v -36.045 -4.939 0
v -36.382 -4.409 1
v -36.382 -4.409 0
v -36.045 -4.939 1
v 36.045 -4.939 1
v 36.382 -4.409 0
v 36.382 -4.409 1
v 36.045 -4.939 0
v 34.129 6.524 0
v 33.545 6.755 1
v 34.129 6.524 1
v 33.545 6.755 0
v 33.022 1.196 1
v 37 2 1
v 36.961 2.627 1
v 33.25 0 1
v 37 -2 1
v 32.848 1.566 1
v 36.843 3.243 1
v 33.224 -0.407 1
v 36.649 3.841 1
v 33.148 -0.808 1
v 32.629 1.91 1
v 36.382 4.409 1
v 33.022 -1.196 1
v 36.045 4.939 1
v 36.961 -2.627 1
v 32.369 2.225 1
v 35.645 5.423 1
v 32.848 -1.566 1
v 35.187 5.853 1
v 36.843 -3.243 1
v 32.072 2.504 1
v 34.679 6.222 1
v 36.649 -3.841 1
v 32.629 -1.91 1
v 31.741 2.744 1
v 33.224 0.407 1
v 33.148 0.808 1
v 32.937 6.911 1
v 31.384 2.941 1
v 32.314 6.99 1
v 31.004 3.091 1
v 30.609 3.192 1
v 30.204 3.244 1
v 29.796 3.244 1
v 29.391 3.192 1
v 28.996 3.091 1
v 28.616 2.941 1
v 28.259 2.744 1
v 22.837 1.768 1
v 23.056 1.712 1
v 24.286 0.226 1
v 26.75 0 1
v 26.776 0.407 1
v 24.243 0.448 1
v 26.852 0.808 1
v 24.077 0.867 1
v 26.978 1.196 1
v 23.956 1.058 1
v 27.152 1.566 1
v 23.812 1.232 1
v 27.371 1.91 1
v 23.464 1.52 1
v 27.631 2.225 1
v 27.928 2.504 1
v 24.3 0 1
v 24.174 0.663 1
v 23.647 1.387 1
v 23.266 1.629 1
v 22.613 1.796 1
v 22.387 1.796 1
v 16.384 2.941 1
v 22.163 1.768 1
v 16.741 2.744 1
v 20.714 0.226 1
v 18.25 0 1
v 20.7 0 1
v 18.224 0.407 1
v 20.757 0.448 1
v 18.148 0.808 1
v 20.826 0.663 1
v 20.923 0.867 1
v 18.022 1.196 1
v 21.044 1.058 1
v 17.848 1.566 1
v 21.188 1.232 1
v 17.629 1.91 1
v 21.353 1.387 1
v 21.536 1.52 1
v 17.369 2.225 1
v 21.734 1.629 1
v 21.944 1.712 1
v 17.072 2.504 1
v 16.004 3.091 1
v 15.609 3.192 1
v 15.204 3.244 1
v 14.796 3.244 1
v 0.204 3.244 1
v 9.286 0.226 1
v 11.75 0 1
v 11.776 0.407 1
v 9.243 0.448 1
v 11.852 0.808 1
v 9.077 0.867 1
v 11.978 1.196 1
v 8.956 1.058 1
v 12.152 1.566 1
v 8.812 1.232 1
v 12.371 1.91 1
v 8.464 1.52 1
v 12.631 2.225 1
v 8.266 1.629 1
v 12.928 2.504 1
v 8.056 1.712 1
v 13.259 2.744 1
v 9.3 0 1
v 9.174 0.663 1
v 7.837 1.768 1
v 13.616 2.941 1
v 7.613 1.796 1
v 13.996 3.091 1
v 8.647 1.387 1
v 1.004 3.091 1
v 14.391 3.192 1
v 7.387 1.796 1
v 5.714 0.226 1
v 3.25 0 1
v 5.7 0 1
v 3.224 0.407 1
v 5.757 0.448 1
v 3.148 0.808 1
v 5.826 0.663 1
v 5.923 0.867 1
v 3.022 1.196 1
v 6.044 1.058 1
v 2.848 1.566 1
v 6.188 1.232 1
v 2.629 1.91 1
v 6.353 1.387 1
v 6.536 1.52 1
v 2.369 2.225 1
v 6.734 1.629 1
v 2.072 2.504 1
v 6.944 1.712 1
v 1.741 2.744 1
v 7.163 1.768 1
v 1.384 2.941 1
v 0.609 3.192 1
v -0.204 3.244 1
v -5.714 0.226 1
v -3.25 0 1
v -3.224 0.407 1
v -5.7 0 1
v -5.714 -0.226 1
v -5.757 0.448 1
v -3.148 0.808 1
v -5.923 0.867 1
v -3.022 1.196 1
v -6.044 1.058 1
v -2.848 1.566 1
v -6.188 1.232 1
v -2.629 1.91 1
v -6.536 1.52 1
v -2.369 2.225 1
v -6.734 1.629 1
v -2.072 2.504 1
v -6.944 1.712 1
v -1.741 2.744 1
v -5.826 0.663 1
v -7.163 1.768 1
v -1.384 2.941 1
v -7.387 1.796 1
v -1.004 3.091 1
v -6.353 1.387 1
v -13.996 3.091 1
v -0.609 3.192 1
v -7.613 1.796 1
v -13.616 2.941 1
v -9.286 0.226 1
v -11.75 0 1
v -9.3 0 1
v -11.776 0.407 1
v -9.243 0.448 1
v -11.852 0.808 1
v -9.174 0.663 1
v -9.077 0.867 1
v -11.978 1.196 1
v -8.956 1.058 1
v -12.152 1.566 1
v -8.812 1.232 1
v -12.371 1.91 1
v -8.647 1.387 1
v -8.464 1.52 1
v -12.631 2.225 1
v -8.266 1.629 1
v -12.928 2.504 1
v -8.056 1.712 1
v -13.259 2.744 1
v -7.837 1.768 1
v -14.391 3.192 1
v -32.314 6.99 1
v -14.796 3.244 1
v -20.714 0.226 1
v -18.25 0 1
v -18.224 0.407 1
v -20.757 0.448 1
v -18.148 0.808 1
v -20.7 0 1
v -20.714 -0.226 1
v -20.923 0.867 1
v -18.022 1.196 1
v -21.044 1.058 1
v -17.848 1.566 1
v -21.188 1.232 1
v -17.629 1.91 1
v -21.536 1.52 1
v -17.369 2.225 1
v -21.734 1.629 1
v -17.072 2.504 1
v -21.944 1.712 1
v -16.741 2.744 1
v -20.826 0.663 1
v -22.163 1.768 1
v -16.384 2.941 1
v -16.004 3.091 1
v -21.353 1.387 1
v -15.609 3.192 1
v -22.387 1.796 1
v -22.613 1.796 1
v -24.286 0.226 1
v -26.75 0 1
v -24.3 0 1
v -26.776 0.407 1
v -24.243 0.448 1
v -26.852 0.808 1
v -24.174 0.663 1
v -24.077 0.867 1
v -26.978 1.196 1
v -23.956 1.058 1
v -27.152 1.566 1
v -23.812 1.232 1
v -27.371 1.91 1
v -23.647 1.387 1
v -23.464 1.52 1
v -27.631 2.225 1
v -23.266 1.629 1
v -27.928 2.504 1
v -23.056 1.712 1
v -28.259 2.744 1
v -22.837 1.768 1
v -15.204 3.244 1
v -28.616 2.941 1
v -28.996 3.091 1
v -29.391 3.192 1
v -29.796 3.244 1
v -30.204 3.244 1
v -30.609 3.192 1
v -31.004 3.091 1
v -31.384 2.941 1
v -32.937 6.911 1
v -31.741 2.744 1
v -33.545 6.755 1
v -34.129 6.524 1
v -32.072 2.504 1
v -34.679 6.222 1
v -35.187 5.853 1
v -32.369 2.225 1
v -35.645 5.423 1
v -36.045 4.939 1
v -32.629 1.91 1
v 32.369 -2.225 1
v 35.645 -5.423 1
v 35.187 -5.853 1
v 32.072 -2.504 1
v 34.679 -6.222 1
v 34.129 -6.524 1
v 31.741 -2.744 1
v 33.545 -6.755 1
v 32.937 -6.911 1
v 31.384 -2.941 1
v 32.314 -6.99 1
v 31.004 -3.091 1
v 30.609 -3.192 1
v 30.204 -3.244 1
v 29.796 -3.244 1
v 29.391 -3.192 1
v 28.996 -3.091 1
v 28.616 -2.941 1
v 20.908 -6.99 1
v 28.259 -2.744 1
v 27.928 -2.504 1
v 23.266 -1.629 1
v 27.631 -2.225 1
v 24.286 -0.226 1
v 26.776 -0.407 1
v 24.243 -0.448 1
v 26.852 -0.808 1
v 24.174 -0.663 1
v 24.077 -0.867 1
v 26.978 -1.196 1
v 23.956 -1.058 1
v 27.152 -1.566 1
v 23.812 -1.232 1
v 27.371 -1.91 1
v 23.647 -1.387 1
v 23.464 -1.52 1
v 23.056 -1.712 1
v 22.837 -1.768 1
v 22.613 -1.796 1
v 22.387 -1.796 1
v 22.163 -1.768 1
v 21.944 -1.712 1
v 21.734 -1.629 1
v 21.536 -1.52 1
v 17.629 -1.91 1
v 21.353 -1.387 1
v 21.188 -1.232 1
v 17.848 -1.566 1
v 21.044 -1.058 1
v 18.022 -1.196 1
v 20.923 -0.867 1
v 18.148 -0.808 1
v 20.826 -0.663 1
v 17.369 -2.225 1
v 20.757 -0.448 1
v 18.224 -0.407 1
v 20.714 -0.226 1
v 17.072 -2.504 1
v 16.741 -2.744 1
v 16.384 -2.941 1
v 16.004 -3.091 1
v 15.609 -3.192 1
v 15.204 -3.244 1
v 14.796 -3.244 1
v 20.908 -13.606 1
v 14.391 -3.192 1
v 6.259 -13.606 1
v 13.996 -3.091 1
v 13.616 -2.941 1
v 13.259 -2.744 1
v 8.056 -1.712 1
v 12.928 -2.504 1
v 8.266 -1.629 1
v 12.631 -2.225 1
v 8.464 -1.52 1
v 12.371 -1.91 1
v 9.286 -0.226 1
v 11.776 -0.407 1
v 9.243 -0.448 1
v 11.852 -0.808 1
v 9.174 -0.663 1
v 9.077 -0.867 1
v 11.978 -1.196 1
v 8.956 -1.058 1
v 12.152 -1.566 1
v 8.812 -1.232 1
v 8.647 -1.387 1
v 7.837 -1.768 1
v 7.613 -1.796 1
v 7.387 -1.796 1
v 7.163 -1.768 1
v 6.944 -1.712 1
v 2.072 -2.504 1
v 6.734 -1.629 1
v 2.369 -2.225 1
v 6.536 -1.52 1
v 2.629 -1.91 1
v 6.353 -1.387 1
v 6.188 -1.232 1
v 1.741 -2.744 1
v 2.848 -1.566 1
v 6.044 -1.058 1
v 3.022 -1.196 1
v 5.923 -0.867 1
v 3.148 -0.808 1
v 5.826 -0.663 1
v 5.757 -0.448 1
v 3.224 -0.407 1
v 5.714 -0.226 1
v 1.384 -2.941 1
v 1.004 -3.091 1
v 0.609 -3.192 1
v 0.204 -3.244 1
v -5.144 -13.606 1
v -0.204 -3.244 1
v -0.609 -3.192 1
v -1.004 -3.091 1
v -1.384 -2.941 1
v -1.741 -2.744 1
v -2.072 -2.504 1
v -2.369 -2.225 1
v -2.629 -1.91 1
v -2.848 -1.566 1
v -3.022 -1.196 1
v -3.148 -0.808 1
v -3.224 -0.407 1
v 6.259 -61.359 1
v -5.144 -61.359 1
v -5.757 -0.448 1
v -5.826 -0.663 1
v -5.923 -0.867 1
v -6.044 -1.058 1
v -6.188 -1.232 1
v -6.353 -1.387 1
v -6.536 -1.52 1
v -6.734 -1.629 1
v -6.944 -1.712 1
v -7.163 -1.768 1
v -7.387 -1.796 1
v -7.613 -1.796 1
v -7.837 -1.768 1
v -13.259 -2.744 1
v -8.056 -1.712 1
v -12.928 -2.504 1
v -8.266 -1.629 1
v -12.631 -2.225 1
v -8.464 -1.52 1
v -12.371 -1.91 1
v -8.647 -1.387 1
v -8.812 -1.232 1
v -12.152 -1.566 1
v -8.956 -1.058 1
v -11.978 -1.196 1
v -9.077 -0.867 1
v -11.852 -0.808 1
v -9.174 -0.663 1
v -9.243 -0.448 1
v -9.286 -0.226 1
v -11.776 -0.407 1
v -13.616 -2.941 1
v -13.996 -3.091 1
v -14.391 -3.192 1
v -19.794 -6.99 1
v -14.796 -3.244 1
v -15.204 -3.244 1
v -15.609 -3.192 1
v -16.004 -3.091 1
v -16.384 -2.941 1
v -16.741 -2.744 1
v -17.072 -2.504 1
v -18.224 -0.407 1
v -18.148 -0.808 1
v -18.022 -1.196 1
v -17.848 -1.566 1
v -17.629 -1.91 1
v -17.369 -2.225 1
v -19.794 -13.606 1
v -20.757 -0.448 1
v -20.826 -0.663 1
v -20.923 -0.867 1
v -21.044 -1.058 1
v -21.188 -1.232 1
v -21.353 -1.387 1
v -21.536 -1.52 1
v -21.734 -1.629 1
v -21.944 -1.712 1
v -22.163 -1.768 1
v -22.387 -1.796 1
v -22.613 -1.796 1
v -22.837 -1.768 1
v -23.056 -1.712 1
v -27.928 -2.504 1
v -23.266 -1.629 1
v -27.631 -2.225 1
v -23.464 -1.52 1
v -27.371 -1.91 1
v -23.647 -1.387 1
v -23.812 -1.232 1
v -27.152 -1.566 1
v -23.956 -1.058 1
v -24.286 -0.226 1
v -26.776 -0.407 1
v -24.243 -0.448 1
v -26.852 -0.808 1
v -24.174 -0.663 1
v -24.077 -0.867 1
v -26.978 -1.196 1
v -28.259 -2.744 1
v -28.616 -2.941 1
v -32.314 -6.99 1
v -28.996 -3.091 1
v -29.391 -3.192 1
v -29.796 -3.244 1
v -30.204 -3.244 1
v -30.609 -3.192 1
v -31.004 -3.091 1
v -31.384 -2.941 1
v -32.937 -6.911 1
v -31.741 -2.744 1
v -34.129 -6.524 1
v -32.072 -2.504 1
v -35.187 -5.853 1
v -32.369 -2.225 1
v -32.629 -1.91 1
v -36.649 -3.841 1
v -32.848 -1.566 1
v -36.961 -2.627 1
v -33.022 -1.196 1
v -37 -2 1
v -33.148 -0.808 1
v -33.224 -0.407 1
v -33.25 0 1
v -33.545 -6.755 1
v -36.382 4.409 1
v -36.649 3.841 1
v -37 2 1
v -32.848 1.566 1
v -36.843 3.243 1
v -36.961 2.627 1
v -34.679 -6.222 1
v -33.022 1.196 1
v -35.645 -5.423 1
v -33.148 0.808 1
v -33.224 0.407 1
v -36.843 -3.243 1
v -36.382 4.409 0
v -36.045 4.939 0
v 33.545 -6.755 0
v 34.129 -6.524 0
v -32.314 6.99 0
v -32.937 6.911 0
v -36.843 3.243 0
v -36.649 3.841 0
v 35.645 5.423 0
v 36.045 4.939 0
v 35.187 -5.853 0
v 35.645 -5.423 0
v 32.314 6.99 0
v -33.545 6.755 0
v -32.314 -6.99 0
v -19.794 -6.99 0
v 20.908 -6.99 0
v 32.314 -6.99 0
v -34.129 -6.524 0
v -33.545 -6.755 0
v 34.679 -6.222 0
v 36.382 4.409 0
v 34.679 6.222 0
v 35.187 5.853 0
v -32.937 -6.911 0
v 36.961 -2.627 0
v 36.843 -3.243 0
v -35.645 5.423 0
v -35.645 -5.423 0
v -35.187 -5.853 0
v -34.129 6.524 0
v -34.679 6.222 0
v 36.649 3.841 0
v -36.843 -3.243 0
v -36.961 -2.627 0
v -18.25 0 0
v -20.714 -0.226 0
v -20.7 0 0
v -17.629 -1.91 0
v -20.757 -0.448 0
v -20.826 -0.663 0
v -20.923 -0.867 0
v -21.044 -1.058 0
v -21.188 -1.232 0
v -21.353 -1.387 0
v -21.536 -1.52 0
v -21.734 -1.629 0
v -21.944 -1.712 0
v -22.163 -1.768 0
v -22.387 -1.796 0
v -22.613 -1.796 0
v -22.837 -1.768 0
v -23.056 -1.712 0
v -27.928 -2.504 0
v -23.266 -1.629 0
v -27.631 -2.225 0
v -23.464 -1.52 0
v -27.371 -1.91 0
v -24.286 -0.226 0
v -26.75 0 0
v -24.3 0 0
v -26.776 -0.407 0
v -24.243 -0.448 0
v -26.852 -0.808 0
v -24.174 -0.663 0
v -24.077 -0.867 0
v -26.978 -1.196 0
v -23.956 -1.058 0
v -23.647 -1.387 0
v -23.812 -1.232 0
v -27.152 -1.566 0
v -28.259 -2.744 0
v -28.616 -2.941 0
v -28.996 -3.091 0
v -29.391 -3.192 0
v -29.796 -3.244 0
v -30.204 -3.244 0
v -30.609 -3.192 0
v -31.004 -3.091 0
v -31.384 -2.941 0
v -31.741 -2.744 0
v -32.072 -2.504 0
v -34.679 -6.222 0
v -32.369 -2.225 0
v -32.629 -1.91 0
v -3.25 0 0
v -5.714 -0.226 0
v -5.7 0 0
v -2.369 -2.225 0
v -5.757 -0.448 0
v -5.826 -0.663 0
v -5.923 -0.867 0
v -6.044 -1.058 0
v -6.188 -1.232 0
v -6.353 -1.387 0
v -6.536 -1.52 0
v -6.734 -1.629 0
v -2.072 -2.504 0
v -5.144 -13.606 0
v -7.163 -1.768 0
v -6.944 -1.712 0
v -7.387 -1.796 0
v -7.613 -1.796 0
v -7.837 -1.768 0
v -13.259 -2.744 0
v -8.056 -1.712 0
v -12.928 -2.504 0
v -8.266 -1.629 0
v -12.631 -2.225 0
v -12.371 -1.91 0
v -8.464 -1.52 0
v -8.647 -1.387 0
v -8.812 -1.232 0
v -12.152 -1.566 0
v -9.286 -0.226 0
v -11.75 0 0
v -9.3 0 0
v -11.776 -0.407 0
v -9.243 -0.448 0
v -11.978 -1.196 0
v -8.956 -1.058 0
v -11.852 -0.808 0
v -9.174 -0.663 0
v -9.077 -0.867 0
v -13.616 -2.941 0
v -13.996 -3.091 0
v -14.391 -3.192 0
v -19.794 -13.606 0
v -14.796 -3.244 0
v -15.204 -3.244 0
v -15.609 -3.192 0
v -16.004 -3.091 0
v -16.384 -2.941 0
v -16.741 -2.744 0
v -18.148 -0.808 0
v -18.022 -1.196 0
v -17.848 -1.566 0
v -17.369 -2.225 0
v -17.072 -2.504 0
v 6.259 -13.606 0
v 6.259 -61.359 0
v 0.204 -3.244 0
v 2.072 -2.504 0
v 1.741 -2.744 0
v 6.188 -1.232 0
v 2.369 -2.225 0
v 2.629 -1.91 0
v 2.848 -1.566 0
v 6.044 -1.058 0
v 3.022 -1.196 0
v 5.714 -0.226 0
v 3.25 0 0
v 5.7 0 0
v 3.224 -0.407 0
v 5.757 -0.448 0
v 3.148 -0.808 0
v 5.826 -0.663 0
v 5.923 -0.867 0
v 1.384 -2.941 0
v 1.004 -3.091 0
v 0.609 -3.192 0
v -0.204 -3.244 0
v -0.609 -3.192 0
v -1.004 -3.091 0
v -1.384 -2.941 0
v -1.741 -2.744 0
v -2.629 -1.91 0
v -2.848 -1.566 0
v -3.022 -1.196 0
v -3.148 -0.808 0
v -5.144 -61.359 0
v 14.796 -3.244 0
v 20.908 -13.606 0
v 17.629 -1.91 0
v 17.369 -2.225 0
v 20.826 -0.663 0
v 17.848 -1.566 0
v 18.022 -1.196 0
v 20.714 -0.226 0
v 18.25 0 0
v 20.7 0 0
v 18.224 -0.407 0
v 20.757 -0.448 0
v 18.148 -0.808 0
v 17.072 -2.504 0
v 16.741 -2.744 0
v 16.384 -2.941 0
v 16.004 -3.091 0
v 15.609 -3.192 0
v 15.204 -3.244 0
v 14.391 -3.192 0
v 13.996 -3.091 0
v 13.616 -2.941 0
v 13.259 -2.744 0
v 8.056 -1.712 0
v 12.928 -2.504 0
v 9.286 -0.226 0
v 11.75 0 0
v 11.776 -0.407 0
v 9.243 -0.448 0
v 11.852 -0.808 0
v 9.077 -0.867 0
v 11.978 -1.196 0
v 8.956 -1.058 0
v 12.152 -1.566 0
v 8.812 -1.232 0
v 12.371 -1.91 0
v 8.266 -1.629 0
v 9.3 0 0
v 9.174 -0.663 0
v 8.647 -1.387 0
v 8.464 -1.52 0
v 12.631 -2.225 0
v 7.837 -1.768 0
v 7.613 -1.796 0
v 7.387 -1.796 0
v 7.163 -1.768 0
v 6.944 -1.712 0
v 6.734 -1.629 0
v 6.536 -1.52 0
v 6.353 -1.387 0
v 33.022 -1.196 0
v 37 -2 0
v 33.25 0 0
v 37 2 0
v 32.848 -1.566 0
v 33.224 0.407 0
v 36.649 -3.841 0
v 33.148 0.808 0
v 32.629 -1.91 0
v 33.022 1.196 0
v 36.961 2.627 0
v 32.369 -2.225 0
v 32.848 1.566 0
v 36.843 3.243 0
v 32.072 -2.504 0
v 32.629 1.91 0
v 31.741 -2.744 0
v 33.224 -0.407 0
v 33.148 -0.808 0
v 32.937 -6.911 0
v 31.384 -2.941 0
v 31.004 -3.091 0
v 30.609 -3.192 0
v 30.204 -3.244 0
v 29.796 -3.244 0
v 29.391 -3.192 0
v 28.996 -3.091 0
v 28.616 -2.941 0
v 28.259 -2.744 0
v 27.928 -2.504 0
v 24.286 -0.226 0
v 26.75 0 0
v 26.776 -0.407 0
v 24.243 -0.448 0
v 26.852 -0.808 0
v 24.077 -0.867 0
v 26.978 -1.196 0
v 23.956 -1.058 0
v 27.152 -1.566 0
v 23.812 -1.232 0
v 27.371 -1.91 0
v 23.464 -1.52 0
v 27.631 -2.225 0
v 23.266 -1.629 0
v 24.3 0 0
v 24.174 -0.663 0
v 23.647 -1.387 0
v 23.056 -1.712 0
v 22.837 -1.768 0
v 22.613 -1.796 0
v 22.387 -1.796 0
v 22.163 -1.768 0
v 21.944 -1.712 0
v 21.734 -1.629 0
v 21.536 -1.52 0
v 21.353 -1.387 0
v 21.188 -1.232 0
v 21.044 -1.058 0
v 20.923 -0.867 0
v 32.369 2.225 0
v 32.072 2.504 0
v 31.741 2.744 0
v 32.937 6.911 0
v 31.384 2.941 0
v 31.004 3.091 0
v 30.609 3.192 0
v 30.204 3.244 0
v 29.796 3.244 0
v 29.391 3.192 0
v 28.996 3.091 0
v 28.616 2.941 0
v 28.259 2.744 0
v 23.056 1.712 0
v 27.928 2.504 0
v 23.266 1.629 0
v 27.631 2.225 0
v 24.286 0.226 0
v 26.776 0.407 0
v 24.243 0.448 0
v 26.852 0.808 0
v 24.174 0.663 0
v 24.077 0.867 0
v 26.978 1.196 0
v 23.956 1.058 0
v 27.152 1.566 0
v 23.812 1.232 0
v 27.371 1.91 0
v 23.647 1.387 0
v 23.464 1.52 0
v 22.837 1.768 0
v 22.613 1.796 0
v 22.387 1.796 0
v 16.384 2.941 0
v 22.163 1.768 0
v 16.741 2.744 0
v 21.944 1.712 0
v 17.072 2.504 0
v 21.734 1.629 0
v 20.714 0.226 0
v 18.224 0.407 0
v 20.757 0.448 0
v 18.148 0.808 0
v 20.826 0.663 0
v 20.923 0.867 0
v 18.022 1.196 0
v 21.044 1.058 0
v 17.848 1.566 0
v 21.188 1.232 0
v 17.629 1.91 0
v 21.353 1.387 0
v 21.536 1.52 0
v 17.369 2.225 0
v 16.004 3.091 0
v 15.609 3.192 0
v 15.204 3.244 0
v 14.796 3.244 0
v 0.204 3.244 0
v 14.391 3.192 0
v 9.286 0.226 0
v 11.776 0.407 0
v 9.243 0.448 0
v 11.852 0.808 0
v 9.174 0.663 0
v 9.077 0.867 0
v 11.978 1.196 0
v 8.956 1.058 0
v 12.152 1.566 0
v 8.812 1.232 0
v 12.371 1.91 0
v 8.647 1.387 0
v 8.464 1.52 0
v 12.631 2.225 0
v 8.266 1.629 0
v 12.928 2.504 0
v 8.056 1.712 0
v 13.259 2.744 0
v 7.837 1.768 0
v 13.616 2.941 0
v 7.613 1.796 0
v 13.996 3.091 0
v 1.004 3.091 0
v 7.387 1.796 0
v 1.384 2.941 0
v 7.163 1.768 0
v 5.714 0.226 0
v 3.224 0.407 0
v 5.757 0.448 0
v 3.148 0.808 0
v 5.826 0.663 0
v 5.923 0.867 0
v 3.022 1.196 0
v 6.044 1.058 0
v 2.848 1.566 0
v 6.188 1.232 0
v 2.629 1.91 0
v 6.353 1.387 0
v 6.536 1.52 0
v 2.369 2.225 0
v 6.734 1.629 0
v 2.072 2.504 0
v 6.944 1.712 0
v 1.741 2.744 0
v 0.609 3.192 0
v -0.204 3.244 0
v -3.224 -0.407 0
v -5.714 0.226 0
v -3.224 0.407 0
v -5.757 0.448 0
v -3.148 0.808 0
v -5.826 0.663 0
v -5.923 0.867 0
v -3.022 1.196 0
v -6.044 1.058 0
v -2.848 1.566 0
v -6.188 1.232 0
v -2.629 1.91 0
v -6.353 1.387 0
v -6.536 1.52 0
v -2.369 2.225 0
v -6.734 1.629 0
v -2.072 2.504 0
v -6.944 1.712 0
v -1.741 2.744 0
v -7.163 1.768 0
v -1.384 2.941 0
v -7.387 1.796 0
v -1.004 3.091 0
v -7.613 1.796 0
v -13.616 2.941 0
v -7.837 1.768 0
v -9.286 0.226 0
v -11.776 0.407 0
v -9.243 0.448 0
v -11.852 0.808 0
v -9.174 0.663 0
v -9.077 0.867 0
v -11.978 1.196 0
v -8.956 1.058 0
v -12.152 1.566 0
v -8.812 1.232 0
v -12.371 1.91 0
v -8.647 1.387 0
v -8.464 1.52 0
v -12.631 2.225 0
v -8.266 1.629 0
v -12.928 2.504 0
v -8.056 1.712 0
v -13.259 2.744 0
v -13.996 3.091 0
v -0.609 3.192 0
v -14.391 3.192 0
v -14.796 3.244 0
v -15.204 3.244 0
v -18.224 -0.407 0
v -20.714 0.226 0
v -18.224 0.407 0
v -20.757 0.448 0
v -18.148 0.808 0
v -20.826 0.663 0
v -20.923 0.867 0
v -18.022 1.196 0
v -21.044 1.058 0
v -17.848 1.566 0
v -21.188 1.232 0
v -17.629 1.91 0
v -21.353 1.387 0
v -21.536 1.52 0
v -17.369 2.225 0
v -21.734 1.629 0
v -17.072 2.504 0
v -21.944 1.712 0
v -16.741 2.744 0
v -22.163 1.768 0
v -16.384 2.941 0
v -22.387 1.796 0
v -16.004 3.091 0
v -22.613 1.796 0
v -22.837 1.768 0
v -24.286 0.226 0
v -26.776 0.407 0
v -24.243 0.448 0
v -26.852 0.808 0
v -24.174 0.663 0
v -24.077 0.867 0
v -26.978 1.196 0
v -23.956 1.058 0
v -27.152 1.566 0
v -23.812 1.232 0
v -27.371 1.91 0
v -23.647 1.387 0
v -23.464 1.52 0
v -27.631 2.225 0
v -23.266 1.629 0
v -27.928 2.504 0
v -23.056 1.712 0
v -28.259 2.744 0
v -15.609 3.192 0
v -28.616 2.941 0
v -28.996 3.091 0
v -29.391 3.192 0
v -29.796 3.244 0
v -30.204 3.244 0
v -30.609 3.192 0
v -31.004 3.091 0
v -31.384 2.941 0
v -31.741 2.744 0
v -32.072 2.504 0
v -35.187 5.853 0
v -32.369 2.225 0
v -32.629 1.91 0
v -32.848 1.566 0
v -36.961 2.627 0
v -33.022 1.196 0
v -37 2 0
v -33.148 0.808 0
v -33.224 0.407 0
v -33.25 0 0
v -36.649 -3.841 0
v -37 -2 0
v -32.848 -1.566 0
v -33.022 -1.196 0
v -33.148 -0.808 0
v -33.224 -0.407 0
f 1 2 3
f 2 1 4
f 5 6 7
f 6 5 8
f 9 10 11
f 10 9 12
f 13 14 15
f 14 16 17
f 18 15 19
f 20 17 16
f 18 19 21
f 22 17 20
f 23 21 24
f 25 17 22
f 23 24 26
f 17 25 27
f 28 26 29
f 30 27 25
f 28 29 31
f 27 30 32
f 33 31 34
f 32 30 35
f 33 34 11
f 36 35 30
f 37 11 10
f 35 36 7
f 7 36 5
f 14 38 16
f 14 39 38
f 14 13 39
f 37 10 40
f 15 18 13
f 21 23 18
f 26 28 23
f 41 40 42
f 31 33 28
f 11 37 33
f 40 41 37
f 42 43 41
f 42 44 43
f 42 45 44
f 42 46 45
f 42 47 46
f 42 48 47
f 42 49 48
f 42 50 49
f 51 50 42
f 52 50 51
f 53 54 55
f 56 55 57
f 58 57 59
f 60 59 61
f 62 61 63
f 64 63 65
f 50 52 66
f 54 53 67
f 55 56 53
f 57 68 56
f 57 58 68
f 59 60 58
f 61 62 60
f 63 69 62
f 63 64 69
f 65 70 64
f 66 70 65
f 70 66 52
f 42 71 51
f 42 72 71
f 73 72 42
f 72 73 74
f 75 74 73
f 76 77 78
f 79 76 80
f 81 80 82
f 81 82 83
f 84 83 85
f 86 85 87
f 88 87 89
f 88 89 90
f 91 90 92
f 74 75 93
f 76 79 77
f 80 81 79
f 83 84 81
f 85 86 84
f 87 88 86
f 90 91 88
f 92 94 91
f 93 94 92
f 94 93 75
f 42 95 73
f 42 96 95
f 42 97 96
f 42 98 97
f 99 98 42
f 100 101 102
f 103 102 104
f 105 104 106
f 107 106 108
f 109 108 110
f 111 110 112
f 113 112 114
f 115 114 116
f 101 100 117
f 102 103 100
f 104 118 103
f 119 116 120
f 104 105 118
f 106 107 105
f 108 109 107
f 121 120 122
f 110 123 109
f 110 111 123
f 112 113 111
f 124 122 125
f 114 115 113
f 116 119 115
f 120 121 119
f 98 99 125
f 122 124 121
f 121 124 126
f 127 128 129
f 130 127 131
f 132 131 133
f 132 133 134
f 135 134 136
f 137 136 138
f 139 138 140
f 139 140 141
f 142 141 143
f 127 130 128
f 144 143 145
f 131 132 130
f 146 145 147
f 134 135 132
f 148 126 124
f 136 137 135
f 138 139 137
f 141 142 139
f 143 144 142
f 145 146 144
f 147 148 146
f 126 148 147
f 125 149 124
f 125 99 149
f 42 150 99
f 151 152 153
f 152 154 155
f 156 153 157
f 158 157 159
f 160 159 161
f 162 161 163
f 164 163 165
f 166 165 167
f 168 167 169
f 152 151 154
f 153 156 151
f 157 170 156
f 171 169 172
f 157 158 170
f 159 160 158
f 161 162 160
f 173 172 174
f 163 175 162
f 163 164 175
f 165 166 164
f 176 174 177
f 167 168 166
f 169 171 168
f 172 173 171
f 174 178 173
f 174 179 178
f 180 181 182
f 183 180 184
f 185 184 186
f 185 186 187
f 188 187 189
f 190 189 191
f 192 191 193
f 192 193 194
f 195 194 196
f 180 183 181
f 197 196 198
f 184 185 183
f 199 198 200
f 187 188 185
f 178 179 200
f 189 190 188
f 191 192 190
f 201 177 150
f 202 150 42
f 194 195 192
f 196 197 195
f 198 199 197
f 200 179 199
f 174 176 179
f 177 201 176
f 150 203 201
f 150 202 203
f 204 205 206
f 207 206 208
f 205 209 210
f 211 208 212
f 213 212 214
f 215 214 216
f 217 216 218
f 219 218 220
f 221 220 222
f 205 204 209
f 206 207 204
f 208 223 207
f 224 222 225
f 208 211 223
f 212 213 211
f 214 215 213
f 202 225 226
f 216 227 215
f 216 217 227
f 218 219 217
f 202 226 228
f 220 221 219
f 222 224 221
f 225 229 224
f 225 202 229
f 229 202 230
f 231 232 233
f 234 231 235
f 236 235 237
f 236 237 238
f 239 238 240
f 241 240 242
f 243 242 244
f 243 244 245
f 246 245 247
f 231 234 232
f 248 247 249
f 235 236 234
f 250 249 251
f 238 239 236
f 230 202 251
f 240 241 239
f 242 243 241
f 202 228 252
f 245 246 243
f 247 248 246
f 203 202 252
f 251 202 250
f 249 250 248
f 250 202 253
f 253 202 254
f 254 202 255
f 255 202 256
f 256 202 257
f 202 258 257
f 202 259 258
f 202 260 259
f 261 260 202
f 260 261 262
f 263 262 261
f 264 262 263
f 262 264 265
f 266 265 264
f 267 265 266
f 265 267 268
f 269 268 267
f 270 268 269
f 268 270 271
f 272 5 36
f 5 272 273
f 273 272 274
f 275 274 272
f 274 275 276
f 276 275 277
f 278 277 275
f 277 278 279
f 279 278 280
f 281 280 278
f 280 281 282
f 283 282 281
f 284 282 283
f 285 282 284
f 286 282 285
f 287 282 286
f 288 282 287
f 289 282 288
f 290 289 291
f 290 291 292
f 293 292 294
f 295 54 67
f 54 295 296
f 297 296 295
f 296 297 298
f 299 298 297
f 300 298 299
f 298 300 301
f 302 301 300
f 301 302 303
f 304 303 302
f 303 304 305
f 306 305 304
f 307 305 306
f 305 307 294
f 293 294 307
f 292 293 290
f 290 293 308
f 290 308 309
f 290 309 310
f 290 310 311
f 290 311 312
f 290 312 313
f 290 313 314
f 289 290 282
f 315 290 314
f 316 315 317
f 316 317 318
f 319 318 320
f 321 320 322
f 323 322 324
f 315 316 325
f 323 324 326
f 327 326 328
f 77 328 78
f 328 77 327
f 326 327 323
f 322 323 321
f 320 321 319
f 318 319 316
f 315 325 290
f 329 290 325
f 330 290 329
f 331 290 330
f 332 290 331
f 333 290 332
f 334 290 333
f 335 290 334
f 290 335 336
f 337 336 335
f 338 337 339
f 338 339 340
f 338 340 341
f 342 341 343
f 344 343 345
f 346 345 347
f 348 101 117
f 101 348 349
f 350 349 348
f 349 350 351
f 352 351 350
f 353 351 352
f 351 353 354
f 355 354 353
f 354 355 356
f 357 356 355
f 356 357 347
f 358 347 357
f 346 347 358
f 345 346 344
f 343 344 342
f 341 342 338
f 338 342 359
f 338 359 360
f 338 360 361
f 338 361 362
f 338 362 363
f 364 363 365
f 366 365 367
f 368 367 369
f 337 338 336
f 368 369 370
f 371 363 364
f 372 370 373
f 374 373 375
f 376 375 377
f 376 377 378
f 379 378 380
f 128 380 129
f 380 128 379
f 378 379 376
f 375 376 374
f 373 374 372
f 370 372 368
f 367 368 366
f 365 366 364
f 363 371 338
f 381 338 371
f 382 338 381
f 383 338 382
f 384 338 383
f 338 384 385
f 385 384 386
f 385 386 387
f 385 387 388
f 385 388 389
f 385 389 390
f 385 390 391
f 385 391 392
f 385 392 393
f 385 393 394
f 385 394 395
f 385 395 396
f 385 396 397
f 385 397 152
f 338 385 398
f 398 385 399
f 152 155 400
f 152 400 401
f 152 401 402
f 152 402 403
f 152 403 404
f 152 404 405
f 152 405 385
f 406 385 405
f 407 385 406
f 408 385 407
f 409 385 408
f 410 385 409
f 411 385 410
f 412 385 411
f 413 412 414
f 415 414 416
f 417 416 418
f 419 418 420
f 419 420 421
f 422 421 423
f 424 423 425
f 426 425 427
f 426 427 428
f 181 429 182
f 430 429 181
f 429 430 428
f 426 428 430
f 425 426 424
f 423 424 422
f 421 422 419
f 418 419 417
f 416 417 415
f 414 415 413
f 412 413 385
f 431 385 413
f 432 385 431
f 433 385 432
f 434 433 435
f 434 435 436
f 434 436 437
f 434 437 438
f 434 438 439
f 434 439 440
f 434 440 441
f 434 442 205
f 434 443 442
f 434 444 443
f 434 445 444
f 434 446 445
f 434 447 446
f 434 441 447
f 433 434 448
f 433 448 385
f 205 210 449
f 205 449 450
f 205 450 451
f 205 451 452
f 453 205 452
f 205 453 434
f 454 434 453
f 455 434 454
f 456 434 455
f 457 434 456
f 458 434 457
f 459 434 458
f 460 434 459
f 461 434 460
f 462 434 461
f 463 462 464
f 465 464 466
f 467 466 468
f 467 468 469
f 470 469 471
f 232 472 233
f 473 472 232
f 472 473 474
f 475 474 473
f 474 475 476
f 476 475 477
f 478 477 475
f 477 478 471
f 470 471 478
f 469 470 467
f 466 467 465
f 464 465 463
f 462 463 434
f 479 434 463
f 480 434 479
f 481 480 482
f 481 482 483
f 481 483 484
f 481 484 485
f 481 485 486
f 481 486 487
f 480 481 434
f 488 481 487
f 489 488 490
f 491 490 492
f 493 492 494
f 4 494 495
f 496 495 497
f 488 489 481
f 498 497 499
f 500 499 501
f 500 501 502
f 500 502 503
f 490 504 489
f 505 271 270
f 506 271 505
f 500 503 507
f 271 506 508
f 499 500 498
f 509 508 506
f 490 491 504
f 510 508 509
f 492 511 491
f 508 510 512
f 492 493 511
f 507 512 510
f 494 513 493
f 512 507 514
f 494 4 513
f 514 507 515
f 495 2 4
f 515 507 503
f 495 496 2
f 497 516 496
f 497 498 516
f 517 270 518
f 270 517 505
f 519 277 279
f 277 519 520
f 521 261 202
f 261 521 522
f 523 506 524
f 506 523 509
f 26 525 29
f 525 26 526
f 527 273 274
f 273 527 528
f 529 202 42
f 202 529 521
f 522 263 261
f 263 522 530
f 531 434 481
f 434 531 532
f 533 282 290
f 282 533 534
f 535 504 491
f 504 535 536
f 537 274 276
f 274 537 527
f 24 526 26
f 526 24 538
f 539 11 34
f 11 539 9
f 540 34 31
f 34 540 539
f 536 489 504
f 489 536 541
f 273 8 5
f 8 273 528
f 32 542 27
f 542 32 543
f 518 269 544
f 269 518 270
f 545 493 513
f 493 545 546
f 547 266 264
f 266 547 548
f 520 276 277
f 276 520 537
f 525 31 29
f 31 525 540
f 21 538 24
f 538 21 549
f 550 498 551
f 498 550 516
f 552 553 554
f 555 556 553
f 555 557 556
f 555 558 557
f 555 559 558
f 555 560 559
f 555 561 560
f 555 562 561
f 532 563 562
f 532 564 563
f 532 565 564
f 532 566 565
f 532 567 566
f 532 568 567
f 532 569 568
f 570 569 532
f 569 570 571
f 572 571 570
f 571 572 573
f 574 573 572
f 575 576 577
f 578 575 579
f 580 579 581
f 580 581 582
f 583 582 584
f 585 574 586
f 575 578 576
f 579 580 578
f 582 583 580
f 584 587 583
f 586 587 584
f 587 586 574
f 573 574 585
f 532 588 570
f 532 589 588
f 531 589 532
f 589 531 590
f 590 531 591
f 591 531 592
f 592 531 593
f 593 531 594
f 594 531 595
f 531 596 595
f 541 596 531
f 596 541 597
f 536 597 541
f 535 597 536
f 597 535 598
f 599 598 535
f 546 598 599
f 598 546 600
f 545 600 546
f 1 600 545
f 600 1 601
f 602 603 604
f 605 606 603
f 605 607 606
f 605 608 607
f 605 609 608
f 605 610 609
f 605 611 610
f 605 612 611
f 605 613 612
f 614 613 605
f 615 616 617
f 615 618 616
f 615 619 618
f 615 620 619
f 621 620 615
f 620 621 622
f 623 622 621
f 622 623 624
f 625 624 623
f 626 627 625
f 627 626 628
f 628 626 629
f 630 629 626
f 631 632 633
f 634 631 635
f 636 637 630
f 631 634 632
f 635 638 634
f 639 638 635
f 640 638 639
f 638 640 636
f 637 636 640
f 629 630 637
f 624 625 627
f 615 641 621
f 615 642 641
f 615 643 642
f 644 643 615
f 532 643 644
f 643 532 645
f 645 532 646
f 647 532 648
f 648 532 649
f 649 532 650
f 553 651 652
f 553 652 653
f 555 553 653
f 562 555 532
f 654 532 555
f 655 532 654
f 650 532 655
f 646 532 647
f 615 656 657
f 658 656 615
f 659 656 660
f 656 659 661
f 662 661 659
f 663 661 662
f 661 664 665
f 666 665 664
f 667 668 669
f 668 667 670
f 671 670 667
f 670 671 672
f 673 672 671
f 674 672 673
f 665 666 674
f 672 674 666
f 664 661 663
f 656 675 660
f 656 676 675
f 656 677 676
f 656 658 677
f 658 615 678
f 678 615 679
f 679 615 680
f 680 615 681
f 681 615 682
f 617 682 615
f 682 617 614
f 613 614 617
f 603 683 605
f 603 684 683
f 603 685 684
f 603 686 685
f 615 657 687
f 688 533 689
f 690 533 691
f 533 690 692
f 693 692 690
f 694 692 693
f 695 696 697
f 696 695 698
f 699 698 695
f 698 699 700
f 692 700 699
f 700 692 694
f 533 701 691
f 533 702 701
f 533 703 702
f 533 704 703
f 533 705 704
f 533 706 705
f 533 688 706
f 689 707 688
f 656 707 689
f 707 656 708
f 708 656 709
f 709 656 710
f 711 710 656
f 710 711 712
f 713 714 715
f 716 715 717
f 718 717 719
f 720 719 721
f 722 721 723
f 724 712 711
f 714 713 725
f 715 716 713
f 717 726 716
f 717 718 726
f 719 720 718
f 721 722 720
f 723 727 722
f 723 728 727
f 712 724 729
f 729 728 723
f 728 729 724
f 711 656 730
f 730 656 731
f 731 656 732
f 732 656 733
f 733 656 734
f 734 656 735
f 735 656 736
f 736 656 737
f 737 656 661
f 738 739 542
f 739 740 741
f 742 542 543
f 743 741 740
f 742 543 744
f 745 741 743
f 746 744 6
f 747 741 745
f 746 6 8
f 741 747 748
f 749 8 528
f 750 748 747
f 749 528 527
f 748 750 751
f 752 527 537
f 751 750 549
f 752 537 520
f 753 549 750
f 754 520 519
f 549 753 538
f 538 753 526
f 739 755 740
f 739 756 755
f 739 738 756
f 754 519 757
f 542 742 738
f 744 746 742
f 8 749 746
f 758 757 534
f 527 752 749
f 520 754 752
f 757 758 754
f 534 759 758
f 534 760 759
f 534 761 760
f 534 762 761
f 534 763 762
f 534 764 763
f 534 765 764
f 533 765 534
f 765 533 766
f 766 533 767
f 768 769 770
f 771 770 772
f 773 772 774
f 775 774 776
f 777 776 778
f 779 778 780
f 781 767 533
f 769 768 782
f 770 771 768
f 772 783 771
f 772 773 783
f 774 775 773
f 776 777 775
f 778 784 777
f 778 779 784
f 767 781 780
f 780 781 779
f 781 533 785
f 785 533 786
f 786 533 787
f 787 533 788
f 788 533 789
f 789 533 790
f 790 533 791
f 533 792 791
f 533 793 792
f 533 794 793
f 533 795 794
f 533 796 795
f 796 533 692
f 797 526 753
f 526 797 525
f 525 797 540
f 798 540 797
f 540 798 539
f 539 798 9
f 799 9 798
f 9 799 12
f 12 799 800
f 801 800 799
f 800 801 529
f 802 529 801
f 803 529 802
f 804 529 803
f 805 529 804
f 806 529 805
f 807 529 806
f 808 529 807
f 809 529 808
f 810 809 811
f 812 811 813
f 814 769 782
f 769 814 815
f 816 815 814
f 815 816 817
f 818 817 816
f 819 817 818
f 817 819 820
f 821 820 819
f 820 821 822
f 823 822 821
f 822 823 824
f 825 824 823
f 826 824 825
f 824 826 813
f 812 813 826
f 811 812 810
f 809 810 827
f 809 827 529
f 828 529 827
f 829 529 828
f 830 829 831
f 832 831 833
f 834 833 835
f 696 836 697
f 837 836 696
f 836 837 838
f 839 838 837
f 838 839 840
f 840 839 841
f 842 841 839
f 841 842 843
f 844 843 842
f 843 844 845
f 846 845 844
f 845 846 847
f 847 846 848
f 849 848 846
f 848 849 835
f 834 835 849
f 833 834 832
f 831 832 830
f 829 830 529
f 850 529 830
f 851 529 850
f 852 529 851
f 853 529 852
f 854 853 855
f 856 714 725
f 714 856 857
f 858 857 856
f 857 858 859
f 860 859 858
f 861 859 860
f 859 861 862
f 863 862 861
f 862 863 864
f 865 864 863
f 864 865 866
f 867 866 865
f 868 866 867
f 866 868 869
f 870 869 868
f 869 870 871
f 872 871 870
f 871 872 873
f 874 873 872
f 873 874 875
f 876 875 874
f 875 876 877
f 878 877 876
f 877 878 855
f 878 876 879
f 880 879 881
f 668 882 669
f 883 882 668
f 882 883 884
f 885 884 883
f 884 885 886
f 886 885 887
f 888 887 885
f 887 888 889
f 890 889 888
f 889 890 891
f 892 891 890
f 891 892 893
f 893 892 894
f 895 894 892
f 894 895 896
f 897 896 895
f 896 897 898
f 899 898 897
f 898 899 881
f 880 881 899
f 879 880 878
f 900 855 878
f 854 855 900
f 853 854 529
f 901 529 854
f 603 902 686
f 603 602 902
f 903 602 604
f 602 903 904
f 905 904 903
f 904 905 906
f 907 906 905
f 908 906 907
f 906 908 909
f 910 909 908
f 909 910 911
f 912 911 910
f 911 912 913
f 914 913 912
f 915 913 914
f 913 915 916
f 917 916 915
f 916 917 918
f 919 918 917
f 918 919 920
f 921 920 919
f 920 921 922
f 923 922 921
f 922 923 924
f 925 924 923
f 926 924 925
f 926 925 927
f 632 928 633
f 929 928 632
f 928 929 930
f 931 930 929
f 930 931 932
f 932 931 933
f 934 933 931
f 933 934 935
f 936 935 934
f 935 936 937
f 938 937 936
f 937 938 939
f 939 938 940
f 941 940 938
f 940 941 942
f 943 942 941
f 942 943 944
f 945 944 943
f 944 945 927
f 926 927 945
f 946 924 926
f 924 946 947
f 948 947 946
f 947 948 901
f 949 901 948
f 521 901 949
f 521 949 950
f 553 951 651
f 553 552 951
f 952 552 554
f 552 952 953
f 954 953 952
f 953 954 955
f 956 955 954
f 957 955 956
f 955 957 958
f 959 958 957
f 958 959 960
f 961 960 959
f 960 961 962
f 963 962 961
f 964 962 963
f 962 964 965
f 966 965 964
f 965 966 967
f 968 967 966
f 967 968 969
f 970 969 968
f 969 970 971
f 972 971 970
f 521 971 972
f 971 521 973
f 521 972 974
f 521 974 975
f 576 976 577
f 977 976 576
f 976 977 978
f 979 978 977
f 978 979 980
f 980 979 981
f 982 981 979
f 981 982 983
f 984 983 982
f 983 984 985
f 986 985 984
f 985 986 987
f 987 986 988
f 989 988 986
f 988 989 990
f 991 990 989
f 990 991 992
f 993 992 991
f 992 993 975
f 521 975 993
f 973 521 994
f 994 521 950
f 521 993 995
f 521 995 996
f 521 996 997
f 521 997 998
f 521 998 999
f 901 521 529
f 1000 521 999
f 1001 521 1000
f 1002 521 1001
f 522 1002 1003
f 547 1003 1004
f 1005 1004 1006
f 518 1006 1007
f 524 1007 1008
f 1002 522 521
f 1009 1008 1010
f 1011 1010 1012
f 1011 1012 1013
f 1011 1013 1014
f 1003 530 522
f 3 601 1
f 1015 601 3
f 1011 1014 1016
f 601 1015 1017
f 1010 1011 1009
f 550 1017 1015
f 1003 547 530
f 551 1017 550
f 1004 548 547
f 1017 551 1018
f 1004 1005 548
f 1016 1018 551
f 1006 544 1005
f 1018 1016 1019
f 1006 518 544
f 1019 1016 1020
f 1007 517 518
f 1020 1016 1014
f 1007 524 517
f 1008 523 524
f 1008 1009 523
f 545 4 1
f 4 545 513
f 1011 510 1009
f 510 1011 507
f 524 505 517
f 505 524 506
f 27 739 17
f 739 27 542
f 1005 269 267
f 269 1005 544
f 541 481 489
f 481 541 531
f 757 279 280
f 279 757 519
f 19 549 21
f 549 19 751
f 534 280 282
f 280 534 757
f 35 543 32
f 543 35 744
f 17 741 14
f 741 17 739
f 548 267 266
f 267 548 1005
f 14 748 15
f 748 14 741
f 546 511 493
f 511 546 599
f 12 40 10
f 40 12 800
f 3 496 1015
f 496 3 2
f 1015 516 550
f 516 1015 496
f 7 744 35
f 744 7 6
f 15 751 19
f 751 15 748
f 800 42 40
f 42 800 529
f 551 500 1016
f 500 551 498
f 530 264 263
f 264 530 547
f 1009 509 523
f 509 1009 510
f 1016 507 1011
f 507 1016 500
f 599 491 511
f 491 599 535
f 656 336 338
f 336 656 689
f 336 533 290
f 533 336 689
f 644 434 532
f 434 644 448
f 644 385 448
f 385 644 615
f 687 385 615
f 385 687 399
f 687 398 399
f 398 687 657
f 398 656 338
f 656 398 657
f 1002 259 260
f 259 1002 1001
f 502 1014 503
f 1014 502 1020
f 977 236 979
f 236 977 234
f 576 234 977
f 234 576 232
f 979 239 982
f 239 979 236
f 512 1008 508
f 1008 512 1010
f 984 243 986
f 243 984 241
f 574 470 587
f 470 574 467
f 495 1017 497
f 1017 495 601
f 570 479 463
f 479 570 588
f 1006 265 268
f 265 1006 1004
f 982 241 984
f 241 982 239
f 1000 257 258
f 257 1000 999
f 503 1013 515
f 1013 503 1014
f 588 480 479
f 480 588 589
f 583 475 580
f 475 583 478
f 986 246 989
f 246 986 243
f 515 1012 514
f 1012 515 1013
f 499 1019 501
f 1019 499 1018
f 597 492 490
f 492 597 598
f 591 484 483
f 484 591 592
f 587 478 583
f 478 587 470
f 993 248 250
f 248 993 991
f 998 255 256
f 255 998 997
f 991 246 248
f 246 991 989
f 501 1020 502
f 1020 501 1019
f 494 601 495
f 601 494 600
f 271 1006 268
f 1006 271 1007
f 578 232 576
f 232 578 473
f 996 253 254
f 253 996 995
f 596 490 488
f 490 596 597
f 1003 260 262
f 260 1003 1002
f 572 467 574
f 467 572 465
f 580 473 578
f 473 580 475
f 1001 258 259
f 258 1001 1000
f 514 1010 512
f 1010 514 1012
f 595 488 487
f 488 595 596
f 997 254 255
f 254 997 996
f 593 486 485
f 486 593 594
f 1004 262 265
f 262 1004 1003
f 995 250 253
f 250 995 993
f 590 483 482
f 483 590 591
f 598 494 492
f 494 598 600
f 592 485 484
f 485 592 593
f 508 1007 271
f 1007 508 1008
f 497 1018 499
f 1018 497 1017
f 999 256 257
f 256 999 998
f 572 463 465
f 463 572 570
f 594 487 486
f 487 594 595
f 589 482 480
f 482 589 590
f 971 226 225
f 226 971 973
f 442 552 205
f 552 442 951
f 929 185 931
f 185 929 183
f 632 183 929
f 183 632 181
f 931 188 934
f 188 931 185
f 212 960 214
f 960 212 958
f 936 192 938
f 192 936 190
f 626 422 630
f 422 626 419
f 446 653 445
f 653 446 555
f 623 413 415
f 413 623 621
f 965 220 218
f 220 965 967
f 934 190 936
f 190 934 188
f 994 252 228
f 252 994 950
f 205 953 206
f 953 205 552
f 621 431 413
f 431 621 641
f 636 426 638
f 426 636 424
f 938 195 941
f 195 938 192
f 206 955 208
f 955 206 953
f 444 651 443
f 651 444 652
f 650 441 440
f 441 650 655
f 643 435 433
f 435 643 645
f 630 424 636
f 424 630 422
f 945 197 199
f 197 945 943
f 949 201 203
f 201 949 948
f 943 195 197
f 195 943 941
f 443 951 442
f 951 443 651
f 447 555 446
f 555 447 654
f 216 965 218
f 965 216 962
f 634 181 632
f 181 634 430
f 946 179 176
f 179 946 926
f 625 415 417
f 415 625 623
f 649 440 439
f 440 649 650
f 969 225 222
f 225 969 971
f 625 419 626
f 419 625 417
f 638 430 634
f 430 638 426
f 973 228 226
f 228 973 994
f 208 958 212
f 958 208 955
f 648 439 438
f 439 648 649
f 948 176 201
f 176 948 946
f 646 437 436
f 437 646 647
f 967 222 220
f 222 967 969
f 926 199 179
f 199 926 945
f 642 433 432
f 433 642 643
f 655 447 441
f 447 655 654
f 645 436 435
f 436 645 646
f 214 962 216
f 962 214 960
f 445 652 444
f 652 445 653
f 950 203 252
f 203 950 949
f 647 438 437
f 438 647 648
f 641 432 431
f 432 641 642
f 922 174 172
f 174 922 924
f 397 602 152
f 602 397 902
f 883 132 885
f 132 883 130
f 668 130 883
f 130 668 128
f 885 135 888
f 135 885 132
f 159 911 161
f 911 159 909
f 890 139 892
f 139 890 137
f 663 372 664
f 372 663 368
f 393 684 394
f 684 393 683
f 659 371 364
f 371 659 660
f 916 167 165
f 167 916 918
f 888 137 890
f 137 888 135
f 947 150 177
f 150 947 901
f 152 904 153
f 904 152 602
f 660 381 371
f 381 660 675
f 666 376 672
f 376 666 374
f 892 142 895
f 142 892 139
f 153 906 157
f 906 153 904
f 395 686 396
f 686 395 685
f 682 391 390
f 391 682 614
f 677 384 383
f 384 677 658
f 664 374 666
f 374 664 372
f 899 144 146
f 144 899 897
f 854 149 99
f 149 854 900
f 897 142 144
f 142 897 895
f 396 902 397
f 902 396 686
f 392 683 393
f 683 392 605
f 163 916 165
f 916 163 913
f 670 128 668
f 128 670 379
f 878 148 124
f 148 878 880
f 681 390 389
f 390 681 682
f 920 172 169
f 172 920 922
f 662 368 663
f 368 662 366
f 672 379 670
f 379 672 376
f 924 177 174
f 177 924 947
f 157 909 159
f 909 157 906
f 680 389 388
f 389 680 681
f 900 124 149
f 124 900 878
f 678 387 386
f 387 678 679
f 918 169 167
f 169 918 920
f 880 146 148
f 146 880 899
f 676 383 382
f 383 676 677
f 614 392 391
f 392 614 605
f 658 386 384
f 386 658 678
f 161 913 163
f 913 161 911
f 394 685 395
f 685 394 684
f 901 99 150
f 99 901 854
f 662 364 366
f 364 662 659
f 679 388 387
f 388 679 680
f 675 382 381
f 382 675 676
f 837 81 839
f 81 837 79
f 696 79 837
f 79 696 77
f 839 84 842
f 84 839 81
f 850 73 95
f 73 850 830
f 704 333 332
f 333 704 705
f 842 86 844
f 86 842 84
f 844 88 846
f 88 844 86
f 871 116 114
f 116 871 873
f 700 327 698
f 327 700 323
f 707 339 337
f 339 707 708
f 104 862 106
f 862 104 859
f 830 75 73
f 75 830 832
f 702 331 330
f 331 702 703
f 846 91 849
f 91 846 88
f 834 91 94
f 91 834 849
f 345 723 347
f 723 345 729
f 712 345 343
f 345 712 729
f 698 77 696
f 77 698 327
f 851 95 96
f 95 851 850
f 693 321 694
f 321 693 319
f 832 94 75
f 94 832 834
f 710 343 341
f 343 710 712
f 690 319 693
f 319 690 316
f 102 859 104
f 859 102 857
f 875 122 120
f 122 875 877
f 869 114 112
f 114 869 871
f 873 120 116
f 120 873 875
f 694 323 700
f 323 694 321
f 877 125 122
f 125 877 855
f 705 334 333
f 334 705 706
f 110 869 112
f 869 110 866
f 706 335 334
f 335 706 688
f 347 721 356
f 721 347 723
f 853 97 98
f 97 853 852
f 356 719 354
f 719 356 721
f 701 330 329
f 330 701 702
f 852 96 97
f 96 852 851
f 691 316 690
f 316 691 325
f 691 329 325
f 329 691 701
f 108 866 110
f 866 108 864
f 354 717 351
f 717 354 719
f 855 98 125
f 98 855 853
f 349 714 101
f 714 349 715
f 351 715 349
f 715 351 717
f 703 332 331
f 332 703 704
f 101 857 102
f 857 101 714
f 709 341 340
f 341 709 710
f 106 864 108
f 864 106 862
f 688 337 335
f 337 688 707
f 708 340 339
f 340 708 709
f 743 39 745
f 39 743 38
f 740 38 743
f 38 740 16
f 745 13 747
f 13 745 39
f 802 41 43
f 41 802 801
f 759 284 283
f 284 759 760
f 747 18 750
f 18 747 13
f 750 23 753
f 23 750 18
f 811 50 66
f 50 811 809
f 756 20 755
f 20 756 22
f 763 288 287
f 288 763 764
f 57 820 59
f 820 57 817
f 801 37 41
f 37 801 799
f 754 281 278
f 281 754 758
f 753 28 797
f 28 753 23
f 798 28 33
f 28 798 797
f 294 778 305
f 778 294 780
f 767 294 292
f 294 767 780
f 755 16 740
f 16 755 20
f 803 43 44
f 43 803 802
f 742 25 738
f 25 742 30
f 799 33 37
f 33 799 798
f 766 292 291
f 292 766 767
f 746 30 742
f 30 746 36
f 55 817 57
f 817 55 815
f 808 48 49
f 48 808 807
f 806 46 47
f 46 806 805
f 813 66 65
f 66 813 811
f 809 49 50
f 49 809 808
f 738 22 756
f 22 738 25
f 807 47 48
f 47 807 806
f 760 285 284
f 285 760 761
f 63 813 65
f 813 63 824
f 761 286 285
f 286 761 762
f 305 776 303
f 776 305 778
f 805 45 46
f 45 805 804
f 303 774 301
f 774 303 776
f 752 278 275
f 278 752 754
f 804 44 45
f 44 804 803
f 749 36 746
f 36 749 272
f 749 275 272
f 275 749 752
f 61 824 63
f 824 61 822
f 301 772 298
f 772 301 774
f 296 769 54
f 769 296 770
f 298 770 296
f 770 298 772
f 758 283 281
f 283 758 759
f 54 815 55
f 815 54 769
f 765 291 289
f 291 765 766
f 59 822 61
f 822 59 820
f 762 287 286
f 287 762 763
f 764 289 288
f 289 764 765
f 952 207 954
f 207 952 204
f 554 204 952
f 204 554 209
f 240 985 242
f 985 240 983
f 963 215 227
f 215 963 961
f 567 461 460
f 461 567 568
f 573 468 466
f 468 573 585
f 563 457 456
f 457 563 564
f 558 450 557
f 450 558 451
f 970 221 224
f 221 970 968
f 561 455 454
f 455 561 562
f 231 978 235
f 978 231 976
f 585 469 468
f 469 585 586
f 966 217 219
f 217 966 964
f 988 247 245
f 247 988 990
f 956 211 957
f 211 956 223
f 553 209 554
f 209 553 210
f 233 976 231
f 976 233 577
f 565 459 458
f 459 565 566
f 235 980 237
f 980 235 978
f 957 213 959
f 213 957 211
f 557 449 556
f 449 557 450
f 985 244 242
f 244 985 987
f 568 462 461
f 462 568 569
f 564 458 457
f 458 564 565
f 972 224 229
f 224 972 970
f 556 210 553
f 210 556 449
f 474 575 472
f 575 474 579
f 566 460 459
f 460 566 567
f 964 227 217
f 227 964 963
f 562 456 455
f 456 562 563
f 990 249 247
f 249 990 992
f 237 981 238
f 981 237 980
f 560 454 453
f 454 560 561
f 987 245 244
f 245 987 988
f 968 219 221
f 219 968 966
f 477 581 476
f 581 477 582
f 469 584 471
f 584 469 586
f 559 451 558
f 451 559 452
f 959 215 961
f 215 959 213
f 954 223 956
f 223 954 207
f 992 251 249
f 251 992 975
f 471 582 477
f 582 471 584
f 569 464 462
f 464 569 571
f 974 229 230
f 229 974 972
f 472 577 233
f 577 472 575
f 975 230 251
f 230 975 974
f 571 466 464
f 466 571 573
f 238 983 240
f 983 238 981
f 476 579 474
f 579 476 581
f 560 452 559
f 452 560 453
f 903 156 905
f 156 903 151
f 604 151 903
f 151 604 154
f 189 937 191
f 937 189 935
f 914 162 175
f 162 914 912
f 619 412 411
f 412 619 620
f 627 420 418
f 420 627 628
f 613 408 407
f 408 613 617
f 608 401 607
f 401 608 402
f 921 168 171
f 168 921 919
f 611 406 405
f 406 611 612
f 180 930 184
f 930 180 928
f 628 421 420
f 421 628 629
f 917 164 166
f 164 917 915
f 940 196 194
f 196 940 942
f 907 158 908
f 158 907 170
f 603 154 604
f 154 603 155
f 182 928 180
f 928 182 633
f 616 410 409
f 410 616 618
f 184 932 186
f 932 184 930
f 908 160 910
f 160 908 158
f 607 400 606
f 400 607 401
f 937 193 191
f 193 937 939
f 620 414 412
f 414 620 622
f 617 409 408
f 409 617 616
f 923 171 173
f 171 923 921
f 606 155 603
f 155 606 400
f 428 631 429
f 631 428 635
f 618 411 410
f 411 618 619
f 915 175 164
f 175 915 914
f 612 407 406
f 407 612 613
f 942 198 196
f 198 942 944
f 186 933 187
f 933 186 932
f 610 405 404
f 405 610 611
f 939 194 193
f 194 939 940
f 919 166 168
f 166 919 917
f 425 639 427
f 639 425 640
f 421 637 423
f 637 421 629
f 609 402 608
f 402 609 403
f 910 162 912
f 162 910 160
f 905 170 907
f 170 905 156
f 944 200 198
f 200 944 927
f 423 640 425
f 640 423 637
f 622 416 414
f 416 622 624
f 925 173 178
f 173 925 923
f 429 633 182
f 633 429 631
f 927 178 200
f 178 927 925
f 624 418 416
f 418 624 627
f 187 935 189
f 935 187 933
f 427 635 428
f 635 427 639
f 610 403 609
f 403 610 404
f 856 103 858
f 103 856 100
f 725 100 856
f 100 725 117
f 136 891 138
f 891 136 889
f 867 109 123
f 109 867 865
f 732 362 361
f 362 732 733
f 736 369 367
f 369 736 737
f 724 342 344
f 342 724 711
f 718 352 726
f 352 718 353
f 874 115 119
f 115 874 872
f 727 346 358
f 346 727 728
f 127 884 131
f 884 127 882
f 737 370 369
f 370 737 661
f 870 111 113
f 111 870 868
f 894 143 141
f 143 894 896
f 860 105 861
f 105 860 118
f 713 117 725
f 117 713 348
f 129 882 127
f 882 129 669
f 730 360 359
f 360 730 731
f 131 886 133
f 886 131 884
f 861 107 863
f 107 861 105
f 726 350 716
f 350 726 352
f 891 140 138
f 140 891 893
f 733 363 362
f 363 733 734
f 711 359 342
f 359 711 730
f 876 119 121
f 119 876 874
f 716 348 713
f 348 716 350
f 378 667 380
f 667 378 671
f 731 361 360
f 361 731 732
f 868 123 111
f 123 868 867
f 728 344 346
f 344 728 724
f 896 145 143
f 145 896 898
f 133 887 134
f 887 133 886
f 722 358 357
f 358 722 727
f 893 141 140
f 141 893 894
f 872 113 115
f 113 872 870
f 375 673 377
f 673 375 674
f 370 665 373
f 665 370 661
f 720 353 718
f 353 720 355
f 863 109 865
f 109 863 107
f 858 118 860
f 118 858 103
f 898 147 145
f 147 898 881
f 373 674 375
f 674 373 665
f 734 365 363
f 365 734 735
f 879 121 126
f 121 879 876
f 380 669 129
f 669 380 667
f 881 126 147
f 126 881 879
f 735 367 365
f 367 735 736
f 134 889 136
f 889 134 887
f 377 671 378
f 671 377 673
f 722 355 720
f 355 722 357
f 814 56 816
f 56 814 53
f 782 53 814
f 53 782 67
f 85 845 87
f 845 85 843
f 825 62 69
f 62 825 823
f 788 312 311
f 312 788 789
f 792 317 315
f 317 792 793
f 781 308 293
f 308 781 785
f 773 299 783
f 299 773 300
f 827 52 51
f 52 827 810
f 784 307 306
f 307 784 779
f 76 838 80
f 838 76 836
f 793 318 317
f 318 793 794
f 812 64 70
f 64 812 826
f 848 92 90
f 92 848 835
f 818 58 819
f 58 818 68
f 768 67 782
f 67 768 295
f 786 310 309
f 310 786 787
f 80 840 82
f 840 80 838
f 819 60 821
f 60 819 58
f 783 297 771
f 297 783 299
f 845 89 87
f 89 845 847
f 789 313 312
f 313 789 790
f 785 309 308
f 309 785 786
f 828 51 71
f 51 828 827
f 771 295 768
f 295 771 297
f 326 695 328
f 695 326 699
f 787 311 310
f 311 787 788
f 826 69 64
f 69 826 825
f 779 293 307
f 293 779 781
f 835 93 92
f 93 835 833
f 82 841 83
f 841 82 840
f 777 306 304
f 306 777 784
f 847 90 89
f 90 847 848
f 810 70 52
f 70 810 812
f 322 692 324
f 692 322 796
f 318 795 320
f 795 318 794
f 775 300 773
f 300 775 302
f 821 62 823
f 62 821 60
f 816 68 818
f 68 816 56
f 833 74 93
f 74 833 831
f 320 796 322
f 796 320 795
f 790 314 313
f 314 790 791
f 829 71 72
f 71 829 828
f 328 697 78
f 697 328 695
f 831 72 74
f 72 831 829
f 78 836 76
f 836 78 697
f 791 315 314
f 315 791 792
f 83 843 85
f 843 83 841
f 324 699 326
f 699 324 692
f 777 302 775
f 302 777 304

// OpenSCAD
$fn = 50;


difference() {
	union() {
		*color(alpha = 1.0000000000, c = "gray") {
			translate(v = [0, 14, 0]) {
				linear_extrude(height = 1) {
					text(font = "Arial:style=Bold", halign = "center", size = 4.5000000000, text = "COMMENT description oobb_plate_shape_p_type_1_depth_5_width_1_thickness_t_extra_oobb_size", valign = "center");
				}
			}
		}
		hull() {
			translate(v = [-32.0000000000, 2.0000000000, 0]) {
				cylinder(h = 1, r = 5);
			}
			translate(v = [32.0000000000, 2.0000000000, 0]) {
				cylinder(h = 1, r = 5);
			}
			translate(v = [-32.0000000000, -2.0000000000, 0]) {
				cylinder(h = 1, r = 5);
			}
			translate(v = [32.0000000000, -2.0000000000, 0]) {
				cylinder(h = 1, r = 5);
			}
		}
		translate(v = [0, -5, 0]) {
			linear_extrude(height = 1) {
				text(font = "DejaVu Sans Mono:style=Bold", halign = "center", size = 57.0000000000, text = "T", valign = "top");
			}
		}
	}
	union() {
		*color(alpha = 1.0000000000, c = "gray") {
			translate(v = [0, 14, 0]) {
				linear_extrude(height = 1) {
					text(font = "Arial:style=Bold", halign = "center", size = 4.5000000000, text = "COMMENT description oobb_holes_shape_n_type_5_width_1_thickness_t_extra_oobb_size_1_height_'all'_holes_true_both_holes", valign = "center");
				}
			}
		}
		translate(v = [-30.0000000000, 0.0000000000, 0]) {
			translate(v = [0, 0, -50]) {
				cylinder(h = 100, r = 3.2500000000);
			}
		}
		translate(v = [-15.0000000000, 0.0000000000, 0]) {
			translate(v = [0, 0, -50]) {
				cylinder(h = 100, r = 3.2500000000);
			}
		}
		translate(v = [0, 0, -50]) {
			cylinder(h = 100, r = 3.2500000000);
		}
		translate(v = [15.0000000000, 0.0000000000, 0]) {
			translate(v = [0, 0, -50]) {
				cylinder(h = 100, r = 3.2500000000);
			}
		}
		translate(v = [30.0000000000, 0.0000000000, 0]) {
			translate(v = [0, 0, -50]) {
				cylinder(h = 100, r = 3.2500000000);
			}
		}
		translate(v = [-30.0000000000, 0.0000000000, 0]) {
			translate(v = [0, 0, -50]) {
				cylinder(h = 100, r = 1.8000000000);
			}
		}
		translate(v = [-22.5000000000, 0.0000000000, 0]) {
			translate(v = [0, 0, -50]) {
				cylinder(h = 100, r = 1.8000000000);
			}
		}
		translate(v = [-15.0000000000, 0.0000000000, 0]) {
			translate(v = [0, 0, -50]) {
				cylinder(h = 100, r = 1.8000000000);
			}
		}
		translate(v = [-7.5000000000, 0.0000000000, 0]) {
			translate(v = [0, 0, -50]) {
				cylinder(h = 100, r = 1.8000000000);
			}
		}
		translate(v = [0, 0, -50]) {
			cylinder(h = 100, r = 1.8000000000);
		}
		translate(v = [7.5000000000, 0.0000000000, 0]) {
			translate(v = [0, 0, -50]) {
				cylinder(h = 100, r = 1.8000000000);
			}
		}
		translate(v = [15.0000000000, 0.0000000000, 0]) {
			translate(v = [0, 0, -50]) {
				cylinder(h = 100, r = 1.8000000000);
			}
		}
		translate(v = [22.5000000000, 0.0000000000, 0]) {
			translate(v = [0, 0, -50]) {
				cylinder(h = 100, r = 1.8000000000);
			}
		}
		translate(v = [30.0000000000, 0.0000000000, 0]) {
			translate(v = [0, 0, -50]) {
				cylinder(h = 100, r = 1.8000000000);
			}
		}
	}
}
